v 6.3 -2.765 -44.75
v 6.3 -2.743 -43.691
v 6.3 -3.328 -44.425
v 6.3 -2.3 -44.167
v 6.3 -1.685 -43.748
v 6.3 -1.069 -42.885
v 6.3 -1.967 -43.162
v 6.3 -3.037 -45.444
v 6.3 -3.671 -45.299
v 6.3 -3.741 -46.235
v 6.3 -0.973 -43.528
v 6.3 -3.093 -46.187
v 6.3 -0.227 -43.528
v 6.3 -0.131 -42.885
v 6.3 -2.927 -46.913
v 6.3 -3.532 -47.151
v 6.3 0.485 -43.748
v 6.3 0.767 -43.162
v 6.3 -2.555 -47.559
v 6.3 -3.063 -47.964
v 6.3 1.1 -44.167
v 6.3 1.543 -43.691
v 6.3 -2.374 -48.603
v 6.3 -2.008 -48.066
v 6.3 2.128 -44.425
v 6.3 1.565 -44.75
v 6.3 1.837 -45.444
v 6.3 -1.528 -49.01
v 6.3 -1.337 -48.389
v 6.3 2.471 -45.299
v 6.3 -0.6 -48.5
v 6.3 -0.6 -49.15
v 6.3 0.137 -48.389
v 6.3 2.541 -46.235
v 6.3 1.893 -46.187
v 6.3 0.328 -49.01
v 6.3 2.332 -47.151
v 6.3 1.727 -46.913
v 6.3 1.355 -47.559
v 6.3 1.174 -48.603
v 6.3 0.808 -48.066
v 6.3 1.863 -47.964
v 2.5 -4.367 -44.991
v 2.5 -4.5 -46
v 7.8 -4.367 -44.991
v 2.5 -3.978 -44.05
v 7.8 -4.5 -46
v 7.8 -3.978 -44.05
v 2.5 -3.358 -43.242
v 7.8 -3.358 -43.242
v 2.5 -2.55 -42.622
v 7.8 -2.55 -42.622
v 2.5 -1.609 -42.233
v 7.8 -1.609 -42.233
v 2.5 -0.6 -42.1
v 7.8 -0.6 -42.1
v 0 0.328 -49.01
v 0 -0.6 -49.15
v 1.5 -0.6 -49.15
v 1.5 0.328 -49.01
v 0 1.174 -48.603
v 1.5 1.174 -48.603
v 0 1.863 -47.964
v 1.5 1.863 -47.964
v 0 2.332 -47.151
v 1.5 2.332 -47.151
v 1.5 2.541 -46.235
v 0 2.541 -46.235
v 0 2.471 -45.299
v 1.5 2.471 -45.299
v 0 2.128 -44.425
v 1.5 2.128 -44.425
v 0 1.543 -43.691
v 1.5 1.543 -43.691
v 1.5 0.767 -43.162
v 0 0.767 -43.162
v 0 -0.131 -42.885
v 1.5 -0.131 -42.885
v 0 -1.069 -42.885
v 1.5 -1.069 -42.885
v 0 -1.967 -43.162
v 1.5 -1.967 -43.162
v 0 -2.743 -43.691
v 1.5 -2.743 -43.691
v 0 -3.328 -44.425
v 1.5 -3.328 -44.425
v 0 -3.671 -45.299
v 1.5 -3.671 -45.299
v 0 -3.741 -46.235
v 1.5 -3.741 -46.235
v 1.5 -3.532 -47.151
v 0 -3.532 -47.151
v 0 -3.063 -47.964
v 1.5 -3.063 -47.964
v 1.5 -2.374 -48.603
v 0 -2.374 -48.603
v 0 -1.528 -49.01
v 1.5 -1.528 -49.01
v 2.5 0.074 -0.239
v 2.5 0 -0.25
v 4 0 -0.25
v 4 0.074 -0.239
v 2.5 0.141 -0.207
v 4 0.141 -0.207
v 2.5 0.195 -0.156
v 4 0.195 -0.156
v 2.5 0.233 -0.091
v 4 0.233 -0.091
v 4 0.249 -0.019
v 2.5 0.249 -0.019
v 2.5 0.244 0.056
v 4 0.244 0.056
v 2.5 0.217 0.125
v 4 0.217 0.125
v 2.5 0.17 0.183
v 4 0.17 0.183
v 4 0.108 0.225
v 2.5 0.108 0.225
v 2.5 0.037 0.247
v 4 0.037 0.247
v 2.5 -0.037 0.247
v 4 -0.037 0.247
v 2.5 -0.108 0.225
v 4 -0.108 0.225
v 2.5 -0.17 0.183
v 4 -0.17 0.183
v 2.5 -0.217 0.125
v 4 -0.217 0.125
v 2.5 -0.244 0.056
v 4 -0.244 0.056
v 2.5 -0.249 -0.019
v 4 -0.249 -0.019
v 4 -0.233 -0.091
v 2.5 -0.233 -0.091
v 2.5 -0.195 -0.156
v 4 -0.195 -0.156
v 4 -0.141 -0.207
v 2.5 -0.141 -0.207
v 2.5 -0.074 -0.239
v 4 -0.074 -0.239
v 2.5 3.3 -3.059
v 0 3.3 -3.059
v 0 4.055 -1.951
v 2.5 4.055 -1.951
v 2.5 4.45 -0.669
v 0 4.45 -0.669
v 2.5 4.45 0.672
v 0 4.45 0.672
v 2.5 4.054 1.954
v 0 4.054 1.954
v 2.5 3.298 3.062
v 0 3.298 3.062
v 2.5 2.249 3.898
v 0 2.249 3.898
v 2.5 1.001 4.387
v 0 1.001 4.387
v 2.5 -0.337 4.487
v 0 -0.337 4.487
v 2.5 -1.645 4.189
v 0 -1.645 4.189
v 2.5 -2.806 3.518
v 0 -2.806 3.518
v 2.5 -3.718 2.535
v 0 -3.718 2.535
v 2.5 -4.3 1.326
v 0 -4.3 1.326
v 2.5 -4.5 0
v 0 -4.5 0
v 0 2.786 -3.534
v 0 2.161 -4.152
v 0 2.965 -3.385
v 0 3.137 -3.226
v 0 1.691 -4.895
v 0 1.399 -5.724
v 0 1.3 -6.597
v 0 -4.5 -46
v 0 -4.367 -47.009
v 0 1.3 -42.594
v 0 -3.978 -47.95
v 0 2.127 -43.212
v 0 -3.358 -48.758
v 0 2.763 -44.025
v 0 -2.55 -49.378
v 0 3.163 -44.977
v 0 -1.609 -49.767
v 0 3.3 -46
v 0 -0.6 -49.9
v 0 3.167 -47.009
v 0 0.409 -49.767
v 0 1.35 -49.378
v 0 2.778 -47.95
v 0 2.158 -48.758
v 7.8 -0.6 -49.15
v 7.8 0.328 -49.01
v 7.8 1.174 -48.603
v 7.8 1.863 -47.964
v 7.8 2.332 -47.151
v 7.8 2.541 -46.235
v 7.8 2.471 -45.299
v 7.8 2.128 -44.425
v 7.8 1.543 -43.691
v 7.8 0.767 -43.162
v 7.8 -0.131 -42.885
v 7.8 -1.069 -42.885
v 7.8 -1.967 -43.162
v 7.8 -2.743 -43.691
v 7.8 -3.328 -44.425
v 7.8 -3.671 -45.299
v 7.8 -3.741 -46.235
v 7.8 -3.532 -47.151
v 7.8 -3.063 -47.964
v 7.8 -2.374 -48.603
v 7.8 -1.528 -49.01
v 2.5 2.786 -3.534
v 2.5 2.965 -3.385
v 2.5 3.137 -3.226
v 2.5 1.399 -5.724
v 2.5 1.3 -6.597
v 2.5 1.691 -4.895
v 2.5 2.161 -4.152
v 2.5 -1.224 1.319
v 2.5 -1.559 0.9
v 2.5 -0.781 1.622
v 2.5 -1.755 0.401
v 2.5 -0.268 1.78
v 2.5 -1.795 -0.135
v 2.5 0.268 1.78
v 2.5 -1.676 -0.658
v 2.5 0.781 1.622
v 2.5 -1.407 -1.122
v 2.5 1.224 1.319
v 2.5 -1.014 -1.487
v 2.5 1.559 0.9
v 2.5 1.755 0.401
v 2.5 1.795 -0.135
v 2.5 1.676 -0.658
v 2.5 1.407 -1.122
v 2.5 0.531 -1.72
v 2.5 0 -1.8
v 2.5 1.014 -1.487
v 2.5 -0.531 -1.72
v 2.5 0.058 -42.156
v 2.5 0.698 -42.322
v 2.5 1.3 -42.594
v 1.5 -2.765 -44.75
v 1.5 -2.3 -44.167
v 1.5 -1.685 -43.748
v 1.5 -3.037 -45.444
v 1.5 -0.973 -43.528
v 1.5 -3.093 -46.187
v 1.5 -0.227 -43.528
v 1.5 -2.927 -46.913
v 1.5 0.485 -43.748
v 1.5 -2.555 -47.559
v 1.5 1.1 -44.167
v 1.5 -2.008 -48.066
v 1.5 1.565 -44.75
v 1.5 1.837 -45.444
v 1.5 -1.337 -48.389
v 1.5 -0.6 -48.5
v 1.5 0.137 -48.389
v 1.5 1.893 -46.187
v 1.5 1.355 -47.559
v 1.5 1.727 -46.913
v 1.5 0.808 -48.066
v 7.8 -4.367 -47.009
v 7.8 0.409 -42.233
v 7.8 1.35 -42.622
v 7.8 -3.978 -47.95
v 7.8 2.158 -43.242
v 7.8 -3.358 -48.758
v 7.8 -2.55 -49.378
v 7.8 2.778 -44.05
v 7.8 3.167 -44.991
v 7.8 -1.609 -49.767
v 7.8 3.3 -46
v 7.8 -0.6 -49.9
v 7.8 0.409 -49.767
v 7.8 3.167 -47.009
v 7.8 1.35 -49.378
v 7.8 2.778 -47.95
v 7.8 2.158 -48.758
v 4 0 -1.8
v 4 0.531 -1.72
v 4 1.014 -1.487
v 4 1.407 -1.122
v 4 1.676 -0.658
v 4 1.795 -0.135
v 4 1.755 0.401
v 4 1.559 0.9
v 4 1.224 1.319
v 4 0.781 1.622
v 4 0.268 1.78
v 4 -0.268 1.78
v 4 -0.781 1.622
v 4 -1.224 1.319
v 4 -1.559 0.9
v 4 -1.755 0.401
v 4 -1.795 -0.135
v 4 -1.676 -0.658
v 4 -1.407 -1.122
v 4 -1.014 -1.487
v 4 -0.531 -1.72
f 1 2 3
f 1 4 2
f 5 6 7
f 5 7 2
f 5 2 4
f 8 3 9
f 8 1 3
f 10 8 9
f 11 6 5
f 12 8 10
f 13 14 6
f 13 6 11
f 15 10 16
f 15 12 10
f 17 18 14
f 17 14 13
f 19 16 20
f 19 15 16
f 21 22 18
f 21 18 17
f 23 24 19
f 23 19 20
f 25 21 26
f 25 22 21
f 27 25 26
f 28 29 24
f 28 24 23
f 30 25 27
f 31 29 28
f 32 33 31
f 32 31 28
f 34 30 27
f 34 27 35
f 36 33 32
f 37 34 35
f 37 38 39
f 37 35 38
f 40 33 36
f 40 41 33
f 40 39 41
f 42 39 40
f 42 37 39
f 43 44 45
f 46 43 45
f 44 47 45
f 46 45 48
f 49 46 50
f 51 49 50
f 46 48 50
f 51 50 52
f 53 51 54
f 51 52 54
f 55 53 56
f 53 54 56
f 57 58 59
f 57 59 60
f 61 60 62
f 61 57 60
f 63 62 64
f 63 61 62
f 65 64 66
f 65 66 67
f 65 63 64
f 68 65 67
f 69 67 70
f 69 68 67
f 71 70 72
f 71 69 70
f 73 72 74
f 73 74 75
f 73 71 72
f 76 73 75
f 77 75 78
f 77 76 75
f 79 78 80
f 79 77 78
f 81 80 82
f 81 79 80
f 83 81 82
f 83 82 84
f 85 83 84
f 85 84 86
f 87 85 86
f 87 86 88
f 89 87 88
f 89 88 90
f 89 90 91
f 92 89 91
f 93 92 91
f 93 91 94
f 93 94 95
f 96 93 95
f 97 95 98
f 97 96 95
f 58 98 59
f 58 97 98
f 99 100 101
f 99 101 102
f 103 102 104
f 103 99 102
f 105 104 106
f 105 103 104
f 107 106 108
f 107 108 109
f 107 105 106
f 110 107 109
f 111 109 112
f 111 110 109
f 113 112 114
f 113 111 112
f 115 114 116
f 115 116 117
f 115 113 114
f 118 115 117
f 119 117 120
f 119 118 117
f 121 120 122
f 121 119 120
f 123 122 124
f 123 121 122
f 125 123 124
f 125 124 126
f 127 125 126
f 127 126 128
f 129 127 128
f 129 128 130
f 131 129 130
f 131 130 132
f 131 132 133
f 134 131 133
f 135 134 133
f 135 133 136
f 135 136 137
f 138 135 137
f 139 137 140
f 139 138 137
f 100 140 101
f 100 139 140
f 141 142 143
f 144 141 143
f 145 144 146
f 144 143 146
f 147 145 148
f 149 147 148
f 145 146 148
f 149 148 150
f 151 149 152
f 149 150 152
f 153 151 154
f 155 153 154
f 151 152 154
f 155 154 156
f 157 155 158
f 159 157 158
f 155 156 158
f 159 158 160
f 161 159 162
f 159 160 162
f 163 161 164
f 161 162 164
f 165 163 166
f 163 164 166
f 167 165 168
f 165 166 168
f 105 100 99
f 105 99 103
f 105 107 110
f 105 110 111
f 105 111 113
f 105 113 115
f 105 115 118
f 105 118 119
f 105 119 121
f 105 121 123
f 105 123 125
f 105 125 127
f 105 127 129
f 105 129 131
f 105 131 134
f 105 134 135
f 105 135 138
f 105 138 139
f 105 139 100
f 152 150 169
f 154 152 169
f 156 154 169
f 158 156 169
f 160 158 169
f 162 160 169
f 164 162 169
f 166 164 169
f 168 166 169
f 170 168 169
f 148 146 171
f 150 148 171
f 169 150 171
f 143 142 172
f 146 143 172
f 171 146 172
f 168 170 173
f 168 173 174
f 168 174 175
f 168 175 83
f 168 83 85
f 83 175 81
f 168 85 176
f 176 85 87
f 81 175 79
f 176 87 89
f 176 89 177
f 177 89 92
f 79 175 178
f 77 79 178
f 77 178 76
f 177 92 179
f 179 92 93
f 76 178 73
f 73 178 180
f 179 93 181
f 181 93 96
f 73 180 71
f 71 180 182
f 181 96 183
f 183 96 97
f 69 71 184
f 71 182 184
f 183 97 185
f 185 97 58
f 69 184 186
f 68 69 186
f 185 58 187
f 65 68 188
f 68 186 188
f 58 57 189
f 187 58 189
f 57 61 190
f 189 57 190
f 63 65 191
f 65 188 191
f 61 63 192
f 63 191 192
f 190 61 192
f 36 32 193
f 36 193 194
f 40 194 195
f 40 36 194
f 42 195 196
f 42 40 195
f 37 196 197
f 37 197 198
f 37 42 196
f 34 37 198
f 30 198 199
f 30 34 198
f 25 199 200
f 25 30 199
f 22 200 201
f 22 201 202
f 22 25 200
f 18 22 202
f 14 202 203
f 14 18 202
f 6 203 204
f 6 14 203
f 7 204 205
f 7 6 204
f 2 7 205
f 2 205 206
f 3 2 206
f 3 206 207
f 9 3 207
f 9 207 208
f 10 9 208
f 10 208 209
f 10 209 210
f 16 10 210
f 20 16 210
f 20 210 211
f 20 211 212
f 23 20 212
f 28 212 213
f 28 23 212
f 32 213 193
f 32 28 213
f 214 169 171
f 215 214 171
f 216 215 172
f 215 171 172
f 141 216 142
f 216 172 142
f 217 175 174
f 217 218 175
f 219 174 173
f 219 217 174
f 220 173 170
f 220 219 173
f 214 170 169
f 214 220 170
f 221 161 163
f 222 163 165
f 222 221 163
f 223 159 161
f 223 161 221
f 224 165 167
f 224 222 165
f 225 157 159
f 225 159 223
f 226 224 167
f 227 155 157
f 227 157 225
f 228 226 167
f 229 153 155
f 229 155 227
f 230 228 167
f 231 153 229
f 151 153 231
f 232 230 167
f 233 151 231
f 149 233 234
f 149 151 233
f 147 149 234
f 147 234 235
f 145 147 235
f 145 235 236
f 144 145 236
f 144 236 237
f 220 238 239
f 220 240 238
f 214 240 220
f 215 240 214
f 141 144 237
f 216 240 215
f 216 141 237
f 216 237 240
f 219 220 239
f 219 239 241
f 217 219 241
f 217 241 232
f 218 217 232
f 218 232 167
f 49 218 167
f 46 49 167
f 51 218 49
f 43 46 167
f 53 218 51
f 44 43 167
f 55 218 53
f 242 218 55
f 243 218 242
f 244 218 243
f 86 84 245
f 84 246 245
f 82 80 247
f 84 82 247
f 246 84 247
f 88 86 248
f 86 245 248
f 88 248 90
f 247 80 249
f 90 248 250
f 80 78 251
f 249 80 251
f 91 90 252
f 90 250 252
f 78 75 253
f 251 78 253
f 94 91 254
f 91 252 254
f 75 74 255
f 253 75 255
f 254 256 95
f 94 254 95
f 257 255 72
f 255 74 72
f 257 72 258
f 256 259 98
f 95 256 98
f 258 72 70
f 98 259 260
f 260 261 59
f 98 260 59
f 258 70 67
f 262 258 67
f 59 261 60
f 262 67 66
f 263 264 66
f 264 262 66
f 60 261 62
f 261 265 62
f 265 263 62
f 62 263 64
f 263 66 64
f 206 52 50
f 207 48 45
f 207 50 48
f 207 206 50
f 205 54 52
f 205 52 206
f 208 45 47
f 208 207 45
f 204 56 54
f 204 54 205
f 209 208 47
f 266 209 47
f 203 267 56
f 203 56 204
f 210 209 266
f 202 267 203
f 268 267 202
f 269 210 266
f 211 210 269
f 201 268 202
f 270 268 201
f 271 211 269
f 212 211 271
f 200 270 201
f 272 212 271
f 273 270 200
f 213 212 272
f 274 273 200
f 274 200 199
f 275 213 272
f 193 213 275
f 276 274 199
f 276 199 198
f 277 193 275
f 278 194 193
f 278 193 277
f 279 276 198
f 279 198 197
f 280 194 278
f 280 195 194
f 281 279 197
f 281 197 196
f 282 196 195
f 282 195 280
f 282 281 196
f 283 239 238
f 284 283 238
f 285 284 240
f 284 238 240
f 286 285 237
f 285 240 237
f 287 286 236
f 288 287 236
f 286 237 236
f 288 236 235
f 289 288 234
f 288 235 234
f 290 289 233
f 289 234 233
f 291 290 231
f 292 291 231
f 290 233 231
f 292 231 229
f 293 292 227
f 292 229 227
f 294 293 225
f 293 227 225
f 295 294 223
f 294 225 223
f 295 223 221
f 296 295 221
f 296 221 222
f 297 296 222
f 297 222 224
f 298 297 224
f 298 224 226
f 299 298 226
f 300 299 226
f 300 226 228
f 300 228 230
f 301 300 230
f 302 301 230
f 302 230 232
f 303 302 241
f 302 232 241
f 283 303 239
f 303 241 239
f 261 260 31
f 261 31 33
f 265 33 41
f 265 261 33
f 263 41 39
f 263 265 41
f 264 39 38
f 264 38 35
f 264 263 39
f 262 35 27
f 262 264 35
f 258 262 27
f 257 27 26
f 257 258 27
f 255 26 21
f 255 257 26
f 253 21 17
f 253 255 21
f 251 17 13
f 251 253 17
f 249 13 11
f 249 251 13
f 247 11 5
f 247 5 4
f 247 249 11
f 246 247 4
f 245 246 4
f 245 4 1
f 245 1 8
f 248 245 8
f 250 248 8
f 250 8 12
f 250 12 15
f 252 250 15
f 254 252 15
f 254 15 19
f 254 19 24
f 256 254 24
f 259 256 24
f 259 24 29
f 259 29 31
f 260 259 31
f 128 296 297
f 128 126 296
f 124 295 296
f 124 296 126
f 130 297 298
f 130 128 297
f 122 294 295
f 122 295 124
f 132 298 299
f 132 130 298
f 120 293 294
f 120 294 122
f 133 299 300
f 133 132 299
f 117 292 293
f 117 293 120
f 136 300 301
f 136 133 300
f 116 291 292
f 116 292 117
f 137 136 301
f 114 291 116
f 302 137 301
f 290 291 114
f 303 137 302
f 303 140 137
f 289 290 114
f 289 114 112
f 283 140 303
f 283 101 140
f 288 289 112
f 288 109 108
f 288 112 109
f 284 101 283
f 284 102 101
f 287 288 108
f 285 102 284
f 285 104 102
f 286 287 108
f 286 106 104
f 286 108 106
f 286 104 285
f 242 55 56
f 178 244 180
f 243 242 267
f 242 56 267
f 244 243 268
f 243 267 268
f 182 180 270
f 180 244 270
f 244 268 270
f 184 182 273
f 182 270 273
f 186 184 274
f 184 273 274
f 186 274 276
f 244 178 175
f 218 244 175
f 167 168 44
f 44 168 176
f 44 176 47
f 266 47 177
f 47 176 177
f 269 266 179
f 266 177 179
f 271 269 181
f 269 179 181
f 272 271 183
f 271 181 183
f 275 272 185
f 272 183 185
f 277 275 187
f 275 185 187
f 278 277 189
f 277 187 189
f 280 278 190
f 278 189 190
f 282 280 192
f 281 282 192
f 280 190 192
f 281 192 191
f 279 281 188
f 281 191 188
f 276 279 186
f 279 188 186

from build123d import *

# Parameters (mm, degrees)
SKETCH_1_R               = 4.5
SKETCH_1_W               = 49.9
SKETCH_1_H               = 7.8
EXTRUDE_1_DEPTH          = 2.5
EXTRUDE_START            = 2.5
SKETCH_1_6_R             = 1.8
SKETCH_1_6_R_2           = 0.25
EXTRUDE_3_DEPTH          = 1.5
SKETCH_1_5_W             = 7.8
SKETCH_1_5_H             = 7.8
EXTRUDE_2_DEPTH          = 7.8
SKETCH_1_7_R             = 2.5
CUT_EXTRUDE_1_DEPTH      = 51.706015422
SKETCH_1_8_R             = 3.15
SKETCH_1_8_R_2           = 2.5
CUT_EXTRUDE_2_DEPTH      = 1.5
CUT_EXTRUDE_START        = 6.3
SKETCH_1_9_R             = 3.15
SKETCH_1_9_R_2           = 2.5
CUT_EXTRUDE_3_DEPTH      = 1.5
SKETCH_2_W               = 0.191868154
SKETCH_2_H               = 2
SKETCH_2_W_2             = 37.6
CUT_EXTRUDE_4_DEPTH      = 51.706015422
FILLET_1_R               = 3.9
CUT_EXTRUDE_5_DEPTH      = 52.59021225
CUT_EXTRUDE_5_DEPTH_BACK = 52.59021225
SKETCH_3_W               = 77.270537225
SKETCH_3_H               = 10.975298688


with BuildPart() as part:
    # 草图1 → 凸台-拉伸1 (new body)
    with BuildSketch(Plane(origin=(0, 0, 0), x_dir=(0, 0, -1), z_dir=(1, 0, 0))):
        Circle(SKETCH_1_R)
        with Locations((24.95, -0.6)):
            Rectangle(SKETCH_1_W, SKETCH_1_H)
    extrude(amount=EXTRUDE_1_DEPTH)

    # 草图1<6> → 凸台-拉伸3 (add)
    with BuildSketch(Plane(origin=(0, 0, 0), x_dir=(0, 0, -1), z_dir=(1, 0, 0)).offset(EXTRUDE_START)):
        Circle(SKETCH_1_6_R)
        Circle(SKETCH_1_6_R_2, mode=Mode.SUBTRACT)
    extrude(amount=EXTRUDE_3_DEPTH)

    # 草图1<5> → 凸台-拉伸2 (add)
    with BuildSketch(Plane(origin=(0, 0, 0), x_dir=(0, 0, -1), z_dir=(1, 0, 0))):
        with Locations((46, -0.6)):
            Rectangle(SKETCH_1_5_W, SKETCH_1_5_H)
    extrude(amount=EXTRUDE_2_DEPTH)

    # 草图1<7> → 切除-拉伸1 (cut, through all)
    with BuildSketch(Plane(origin=(0, 0, 0), x_dir=(0, 0, -1), z_dir=(1, 0, 0))):
        with Locations((46, -0.6)):
            Circle(SKETCH_1_7_R)
    extrude(amount=CUT_EXTRUDE_1_DEPTH, mode=Mode.SUBTRACT)

    # 草图1<8> → 切除-拉伸2 (cut)
    with BuildSketch(Plane(origin=(0, 0, 0), x_dir=(0, 0, -1), z_dir=(1, 0, 0))):
        with Locations((46, -0.6)):
            Circle(SKETCH_1_8_R)
        with Locations((46, -0.6)):
            Circle(SKETCH_1_8_R_2, mode=Mode.SUBTRACT)
    extrude(amount=CUT_EXTRUDE_2_DEPTH, mode=Mode.SUBTRACT)

    # 草图1<9> → 切除-拉伸3 (cut)
    with BuildSketch(Plane(origin=(0, 0, 0), x_dir=(0, 0, -1), z_dir=(1, 0, 0)).offset(CUT_EXTRUDE_START)):
        with Locations((46, -0.6)):
            Circle(SKETCH_1_9_R)
        with Locations((46, -0.6)):
            Circle(SKETCH_1_9_R_2, mode=Mode.SUBTRACT)
    extrude(amount=CUT_EXTRUDE_3_DEPTH, mode=Mode.SUBTRACT)

    # 草图2 → 切除-拉伸4 (cut, through all)
    with BuildSketch(Plane.ZY):
        with BuildLine():
            Line((-3.059411708, 3.3), (-4.308131846, 3.3))
            Line((-4.308131846, 3.3), (-4.308131846, 1.3))
            ThreePointArc((-4.308131846, 1.3), (-3.817089795, 2.383238447), (-3.059411708, 3.3))
        make_face()
        with Locations((-4.404065923, 2.3)):
            Rectangle(SKETCH_2_W, SKETCH_2_H)
        with Locations((-23.3, 2.3)):
            Rectangle(SKETCH_2_W_2, SKETCH_2_H)
    extrude(amount=-CUT_EXTRUDE_4_DEPTH, mode=Mode.SUBTRACT)

    # 圆角1
    fillet_1_edges = [part.edges().sort_by_distance(p)[0] for p in [
        (1.25, 1.3, -4.308131846),
    ]]
    fillet(fillet_1_edges, radius=FILLET_1_R)
    fillet_1_2_edges = [part.edges().sort_by_distance(p)[0] for p in [
        (3.9, -4.5, -49.9),
        (3.9, 3.3, -49.9),
        (5.15, -4.5, -42.1),
        (3.9, 3.3, -42.1),
    ]]
    fillet(fillet_1_2_edges, radius=FILLET_1_R - 0.0001)  # a hair under: the kernel refuses the full size


with BuildPart() as body_2:
    # 镜向2: mirrored copy
    add(part.part.mirror(Plane.ZY.offset(1)))

    # 草图3 → 切除-拉伸5 (cut, two sides: drawn at the far end of the back side and taken through both)
    with BuildSketch(Plane(origin=(-4.5, 0, 0), x_dir=(0, 0, 1), z_dir=(0, -1, 0)).offset(-CUT_EXTRUDE_5_DEPTH_BACK)):
        with Locations((-16.91889565, 1.946720459)):
            Rectangle(SKETCH_3_W, SKETCH_3_H)
    extrude(amount=CUT_EXTRUDE_5_DEPTH + CUT_EXTRUDE_5_DEPTH_BACK, mode=Mode.SUBTRACT)


solid = part.part
